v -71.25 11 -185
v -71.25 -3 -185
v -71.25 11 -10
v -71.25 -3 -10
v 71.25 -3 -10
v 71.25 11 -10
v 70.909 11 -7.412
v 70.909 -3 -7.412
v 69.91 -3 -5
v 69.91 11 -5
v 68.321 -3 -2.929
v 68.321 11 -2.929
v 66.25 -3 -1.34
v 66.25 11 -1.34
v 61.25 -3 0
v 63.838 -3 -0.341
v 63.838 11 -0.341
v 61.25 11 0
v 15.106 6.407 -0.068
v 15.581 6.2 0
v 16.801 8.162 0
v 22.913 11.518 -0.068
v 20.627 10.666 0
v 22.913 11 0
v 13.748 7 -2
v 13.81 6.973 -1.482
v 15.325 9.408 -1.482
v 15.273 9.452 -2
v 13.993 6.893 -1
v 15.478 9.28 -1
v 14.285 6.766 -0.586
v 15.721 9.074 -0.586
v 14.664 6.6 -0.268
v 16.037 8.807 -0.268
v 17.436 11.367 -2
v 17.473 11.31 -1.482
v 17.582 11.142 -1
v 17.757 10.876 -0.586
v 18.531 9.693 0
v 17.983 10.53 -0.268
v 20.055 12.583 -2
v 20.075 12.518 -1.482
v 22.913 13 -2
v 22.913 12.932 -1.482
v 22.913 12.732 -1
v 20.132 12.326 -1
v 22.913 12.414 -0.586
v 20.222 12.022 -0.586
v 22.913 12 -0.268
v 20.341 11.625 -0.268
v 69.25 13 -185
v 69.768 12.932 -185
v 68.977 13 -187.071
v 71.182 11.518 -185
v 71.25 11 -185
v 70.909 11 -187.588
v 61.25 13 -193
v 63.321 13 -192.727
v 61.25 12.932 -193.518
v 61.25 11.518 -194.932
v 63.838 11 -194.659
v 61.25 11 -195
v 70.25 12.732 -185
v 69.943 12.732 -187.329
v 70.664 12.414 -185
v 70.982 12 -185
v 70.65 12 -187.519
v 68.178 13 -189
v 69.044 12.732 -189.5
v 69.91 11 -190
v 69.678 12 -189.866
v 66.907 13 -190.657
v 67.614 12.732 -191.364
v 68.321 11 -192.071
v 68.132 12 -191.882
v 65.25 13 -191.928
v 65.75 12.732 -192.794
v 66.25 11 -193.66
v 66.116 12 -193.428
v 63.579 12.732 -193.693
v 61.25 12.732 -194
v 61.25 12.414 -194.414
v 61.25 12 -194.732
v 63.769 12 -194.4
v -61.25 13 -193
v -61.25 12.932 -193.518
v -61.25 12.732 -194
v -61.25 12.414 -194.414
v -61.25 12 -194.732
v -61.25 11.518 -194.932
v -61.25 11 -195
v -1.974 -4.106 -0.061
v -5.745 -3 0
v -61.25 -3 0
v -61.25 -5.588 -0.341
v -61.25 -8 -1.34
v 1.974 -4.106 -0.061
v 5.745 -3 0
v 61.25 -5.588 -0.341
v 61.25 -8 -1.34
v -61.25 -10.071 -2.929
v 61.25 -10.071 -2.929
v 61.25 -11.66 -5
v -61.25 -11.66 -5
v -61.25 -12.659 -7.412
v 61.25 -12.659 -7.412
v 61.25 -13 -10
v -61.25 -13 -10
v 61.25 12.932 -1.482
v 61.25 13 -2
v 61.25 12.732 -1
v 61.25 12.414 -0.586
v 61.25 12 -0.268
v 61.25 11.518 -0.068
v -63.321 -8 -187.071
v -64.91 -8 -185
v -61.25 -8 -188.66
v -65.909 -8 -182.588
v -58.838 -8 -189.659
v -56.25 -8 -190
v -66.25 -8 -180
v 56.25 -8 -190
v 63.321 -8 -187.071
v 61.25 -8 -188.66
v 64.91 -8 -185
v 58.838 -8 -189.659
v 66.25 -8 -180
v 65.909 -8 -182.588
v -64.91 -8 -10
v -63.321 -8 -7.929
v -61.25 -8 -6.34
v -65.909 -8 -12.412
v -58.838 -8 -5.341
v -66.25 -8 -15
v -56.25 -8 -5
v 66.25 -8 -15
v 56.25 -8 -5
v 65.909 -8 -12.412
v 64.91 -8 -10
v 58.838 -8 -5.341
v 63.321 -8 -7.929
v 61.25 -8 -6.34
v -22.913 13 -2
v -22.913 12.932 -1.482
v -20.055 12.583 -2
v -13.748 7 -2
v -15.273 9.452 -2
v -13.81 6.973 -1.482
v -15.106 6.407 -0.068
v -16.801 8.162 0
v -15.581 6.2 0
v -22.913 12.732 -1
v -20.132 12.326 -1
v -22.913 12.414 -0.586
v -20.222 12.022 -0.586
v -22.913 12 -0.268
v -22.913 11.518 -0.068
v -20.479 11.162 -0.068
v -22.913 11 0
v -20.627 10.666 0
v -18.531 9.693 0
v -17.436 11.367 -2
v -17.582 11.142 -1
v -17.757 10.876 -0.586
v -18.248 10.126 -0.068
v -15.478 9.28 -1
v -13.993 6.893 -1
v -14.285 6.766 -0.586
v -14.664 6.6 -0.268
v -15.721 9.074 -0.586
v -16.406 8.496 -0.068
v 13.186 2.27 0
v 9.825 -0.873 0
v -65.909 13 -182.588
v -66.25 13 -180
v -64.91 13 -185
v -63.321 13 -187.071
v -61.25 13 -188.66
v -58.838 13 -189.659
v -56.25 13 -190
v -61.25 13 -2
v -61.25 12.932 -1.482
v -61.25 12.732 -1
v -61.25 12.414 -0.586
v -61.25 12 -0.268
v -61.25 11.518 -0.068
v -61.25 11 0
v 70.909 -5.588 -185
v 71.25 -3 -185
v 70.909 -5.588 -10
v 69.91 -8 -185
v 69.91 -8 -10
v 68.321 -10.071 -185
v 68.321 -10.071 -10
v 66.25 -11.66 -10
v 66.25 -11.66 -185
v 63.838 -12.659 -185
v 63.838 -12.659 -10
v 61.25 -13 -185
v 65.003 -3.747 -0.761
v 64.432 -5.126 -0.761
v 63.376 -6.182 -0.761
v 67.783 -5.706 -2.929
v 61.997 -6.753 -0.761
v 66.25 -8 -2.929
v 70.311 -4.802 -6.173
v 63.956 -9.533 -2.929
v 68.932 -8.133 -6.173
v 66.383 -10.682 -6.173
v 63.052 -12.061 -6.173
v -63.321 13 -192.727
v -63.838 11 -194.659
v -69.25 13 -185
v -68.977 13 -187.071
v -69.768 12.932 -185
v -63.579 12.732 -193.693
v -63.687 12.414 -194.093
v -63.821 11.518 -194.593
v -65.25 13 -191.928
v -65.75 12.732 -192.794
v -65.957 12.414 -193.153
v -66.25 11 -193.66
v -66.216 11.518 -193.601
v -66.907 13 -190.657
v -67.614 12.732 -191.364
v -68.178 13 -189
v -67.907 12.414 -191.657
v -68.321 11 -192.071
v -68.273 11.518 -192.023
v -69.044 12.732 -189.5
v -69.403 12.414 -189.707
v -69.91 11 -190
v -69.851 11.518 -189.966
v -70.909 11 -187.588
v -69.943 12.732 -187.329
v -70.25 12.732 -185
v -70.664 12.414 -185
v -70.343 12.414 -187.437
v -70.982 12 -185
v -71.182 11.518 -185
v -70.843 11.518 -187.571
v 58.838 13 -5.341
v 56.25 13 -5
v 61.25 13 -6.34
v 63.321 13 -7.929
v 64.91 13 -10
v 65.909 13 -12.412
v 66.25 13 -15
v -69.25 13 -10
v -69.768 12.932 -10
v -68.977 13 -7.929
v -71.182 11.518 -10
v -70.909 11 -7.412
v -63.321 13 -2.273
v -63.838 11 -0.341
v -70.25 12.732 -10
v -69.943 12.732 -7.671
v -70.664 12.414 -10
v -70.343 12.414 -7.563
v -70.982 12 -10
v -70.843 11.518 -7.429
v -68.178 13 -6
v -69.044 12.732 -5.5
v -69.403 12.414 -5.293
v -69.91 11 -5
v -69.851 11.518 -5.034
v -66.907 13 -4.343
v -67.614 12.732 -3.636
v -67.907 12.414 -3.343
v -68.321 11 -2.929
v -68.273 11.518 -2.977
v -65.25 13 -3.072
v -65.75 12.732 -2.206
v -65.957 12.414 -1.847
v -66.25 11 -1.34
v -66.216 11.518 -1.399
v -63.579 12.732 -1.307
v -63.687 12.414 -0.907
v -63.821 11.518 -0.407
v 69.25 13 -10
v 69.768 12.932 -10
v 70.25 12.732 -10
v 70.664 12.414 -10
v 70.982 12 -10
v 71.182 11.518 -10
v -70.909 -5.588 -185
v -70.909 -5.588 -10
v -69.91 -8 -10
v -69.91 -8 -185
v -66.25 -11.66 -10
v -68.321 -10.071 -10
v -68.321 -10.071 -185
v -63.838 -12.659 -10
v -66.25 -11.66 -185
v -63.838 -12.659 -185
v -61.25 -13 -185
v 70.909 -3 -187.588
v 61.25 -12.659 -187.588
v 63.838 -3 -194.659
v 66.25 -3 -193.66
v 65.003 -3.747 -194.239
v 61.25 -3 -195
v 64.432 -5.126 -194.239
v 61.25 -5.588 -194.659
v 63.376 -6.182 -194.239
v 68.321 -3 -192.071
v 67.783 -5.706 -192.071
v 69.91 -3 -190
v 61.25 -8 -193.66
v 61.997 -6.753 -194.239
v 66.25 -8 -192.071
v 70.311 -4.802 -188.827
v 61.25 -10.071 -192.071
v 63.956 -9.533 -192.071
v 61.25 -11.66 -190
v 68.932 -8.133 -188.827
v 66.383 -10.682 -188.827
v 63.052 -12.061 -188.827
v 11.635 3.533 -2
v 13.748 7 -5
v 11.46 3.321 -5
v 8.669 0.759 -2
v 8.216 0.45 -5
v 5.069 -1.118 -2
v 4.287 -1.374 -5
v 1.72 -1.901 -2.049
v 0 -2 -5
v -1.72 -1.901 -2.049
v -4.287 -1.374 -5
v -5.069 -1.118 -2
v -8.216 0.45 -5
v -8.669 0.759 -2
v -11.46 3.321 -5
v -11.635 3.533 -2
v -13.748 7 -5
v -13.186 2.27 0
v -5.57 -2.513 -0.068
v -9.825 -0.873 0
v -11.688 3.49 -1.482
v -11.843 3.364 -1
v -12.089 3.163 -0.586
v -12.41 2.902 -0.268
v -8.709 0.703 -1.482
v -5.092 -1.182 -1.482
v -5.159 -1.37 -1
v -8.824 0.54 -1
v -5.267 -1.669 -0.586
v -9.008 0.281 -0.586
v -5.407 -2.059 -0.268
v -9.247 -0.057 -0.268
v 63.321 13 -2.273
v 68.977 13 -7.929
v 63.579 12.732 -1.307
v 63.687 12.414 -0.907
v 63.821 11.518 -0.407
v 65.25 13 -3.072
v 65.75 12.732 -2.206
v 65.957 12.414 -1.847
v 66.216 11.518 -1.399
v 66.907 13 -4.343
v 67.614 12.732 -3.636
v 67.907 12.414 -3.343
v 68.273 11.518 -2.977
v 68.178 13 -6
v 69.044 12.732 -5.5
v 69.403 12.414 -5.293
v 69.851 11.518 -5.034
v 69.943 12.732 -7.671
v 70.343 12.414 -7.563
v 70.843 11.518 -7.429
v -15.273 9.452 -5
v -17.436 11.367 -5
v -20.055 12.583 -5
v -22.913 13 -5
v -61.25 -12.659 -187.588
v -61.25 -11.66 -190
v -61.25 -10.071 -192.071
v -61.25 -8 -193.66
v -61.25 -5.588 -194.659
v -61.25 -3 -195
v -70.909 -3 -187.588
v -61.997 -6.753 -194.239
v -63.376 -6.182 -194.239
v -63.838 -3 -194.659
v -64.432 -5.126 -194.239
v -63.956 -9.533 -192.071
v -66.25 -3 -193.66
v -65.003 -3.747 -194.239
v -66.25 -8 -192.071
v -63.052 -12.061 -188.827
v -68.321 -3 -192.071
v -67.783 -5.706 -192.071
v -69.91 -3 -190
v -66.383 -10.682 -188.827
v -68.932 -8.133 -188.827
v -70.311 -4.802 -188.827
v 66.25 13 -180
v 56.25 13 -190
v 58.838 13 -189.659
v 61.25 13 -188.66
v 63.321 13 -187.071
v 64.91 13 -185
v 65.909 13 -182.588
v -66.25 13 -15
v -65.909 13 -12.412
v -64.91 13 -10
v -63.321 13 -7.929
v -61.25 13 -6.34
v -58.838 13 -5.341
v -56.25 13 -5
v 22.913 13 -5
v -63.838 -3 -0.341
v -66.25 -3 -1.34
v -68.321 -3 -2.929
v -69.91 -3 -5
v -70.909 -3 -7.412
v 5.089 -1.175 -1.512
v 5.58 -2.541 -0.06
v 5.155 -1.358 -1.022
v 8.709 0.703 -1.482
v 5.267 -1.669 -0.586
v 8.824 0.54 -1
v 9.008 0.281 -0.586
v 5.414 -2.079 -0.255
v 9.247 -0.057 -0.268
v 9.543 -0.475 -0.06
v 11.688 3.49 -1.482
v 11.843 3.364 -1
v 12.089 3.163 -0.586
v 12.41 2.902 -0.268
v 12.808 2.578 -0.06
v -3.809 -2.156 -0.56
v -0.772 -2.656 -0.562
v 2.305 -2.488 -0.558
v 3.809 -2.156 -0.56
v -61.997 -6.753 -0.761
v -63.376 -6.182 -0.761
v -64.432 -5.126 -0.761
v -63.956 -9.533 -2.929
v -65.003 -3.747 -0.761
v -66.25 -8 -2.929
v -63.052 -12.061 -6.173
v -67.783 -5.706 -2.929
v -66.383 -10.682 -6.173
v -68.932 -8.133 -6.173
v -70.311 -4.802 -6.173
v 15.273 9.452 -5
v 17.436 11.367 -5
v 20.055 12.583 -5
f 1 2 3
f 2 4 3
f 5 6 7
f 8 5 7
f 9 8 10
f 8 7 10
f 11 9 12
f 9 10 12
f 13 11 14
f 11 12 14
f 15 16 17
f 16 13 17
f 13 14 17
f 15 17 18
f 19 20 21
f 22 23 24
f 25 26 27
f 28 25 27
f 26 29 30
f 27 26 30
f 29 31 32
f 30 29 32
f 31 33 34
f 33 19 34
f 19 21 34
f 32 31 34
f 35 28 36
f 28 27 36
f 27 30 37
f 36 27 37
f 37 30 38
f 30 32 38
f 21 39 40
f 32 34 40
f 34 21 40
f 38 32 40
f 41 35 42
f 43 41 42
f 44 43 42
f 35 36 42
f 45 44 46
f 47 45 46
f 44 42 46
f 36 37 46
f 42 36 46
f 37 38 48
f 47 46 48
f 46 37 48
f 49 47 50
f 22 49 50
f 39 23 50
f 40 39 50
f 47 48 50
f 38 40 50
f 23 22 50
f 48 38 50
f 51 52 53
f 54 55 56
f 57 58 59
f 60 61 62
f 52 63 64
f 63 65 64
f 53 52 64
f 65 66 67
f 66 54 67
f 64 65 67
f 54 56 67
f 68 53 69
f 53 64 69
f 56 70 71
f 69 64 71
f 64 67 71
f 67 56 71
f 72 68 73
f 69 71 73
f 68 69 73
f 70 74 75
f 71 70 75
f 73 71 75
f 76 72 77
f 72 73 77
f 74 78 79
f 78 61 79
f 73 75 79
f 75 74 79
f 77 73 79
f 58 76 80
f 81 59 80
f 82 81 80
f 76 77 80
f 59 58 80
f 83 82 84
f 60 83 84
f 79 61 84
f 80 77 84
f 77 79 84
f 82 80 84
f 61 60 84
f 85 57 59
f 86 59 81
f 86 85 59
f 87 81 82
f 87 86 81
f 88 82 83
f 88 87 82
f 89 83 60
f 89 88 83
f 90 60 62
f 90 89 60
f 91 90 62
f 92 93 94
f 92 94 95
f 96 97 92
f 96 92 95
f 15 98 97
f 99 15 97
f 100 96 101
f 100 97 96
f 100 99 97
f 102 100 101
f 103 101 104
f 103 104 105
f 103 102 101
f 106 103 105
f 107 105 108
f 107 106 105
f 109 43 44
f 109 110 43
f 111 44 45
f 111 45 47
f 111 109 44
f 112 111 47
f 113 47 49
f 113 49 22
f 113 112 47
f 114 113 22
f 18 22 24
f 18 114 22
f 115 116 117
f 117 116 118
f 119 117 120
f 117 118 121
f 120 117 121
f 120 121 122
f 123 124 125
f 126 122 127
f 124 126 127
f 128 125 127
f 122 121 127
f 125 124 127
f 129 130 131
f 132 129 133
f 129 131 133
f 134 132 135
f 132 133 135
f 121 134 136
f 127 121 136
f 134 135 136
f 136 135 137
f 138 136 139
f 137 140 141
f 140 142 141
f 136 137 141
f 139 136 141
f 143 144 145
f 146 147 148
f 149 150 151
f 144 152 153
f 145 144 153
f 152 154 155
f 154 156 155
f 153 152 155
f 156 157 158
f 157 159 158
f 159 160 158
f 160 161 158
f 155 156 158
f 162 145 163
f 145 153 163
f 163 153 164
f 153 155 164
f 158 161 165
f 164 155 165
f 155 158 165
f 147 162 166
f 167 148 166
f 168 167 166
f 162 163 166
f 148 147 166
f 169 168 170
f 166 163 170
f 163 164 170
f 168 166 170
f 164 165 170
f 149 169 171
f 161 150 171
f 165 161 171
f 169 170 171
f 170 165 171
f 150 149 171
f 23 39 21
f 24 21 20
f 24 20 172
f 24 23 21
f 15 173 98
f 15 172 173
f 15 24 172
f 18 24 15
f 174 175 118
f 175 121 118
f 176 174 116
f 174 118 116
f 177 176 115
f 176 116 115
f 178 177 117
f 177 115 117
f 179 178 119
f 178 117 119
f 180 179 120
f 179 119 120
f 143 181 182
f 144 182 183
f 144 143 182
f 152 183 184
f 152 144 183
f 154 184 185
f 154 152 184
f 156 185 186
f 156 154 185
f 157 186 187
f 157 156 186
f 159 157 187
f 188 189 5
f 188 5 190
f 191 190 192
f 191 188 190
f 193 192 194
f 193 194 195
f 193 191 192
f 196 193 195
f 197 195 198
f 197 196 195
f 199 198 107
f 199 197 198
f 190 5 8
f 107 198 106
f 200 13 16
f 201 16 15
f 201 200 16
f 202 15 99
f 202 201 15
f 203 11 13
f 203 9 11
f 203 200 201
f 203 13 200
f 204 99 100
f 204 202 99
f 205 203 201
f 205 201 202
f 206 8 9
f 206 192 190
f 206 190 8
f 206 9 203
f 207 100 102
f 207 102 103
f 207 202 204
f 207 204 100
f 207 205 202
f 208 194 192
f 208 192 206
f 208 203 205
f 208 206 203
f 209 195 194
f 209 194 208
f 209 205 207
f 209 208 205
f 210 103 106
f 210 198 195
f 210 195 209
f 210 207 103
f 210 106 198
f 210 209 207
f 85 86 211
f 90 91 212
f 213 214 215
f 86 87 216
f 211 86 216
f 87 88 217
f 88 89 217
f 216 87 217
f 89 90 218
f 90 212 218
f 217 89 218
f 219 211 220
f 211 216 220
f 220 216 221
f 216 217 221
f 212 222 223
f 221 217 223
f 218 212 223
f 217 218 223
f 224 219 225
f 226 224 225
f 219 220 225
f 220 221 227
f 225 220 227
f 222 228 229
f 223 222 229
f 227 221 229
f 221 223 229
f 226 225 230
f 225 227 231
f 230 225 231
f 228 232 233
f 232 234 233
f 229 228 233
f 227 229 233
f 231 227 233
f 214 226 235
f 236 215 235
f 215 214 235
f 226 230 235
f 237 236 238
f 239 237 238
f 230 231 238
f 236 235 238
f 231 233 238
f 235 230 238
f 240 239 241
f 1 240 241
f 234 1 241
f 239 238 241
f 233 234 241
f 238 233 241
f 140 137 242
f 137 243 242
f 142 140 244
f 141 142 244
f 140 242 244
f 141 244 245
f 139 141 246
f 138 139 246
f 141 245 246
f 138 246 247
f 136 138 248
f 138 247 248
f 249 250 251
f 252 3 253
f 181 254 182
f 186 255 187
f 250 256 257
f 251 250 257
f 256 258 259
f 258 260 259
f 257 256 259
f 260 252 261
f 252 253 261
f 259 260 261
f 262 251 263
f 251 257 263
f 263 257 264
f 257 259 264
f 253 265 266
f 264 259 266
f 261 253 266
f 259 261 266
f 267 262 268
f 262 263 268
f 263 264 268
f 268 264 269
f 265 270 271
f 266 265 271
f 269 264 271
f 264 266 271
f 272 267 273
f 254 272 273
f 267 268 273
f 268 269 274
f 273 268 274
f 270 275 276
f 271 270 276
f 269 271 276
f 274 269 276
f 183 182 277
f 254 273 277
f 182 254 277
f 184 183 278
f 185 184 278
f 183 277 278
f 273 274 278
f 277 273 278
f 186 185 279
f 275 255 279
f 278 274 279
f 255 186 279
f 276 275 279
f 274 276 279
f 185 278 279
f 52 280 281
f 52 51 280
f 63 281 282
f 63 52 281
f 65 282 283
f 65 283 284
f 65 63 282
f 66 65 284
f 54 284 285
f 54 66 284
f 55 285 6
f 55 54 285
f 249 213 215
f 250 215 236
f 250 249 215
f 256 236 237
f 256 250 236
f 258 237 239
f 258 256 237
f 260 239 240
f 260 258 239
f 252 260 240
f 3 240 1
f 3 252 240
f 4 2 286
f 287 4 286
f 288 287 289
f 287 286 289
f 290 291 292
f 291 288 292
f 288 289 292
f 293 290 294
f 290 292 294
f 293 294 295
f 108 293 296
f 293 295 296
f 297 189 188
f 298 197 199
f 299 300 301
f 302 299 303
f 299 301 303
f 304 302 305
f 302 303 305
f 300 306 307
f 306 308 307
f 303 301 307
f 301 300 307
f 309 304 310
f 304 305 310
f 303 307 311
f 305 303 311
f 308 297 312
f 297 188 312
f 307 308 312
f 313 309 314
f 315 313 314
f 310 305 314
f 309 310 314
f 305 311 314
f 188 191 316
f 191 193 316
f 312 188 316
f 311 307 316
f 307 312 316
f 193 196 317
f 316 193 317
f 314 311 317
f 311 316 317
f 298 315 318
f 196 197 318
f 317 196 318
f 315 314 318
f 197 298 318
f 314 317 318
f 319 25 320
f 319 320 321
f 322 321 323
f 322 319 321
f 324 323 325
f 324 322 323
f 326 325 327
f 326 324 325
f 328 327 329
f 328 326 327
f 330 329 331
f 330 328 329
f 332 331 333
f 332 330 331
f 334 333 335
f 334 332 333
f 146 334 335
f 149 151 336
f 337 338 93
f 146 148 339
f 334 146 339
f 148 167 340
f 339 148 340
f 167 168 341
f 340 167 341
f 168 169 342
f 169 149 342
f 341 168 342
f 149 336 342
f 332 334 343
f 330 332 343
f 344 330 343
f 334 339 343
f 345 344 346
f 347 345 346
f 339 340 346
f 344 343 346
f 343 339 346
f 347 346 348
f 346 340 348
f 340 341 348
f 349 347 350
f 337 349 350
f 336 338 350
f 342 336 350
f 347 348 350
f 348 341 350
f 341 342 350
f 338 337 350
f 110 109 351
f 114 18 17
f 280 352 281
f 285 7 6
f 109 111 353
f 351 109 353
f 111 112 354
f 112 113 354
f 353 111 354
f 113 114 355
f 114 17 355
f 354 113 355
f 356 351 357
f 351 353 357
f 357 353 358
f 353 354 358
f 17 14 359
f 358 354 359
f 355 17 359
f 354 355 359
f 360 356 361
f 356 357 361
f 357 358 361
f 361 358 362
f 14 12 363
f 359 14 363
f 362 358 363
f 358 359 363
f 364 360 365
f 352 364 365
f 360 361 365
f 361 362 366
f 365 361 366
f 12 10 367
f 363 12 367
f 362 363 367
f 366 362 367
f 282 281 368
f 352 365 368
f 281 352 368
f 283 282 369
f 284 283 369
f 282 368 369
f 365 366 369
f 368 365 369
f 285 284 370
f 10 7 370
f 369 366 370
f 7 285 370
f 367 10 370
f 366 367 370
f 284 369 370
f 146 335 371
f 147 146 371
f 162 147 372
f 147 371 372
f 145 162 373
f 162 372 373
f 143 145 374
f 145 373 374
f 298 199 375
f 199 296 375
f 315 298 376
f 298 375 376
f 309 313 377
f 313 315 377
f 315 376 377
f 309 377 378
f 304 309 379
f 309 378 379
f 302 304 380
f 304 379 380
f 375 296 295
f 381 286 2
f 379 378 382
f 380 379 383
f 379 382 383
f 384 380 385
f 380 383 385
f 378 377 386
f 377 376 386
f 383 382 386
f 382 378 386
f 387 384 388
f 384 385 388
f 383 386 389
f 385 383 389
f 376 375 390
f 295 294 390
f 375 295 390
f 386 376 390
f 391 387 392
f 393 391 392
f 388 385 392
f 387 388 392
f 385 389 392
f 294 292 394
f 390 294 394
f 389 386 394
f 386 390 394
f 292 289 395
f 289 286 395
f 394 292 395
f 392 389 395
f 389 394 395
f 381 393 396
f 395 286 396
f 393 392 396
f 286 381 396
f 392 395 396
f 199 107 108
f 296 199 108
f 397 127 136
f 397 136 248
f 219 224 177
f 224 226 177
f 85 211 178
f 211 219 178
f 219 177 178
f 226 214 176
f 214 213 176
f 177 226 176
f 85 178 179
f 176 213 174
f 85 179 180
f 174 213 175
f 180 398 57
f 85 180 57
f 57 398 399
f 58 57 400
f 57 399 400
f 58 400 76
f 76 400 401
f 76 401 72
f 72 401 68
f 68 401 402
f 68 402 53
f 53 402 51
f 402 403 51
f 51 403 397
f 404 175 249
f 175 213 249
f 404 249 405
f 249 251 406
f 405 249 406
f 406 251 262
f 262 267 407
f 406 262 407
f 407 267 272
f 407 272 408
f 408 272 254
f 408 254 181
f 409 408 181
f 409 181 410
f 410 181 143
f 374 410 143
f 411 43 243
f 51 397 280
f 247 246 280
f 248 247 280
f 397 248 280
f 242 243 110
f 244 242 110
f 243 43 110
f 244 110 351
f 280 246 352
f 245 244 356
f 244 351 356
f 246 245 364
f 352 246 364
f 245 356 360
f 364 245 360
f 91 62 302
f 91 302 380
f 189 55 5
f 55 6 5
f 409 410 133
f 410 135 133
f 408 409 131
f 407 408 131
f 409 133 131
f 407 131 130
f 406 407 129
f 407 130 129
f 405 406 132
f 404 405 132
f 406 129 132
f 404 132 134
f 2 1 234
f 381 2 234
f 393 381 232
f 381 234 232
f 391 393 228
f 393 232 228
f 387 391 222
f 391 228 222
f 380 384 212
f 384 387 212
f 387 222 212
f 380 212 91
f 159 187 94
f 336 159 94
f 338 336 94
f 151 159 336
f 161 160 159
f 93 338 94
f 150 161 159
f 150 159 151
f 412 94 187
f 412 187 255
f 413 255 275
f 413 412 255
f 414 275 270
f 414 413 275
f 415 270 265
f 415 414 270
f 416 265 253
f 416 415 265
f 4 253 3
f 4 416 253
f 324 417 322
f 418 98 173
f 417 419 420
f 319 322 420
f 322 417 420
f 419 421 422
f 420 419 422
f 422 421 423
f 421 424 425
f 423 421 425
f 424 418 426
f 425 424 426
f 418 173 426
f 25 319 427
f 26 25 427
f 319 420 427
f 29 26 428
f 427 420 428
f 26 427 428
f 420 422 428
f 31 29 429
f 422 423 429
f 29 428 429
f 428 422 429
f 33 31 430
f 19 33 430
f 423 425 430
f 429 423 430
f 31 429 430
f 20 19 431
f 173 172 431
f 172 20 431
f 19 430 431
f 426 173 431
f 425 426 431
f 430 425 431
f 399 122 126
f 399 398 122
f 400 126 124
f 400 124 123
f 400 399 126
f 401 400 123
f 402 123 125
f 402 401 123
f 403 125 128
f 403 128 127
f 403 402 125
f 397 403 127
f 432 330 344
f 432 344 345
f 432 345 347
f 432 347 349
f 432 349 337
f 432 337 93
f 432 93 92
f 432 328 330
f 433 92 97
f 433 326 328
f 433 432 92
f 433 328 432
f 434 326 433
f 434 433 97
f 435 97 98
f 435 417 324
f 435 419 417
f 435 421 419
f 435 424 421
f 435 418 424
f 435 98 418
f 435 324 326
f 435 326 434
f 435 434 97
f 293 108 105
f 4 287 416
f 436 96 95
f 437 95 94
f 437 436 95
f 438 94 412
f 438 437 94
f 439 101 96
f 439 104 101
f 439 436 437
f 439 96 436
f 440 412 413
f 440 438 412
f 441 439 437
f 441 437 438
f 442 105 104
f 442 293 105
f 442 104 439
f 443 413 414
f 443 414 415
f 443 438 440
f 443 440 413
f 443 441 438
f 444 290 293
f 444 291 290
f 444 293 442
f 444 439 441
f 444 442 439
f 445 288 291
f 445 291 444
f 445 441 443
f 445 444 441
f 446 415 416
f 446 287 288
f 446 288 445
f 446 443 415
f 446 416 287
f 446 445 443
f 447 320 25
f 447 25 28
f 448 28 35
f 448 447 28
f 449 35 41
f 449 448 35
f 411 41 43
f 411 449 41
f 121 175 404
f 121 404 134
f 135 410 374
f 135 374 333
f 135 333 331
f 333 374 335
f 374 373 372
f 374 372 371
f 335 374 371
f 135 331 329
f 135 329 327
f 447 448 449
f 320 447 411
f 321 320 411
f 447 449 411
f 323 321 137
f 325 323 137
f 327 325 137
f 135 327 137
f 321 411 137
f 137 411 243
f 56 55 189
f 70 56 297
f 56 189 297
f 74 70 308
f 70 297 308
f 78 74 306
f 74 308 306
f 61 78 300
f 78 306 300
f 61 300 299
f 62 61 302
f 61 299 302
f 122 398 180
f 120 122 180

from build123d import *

# Parameters (mm, degrees)
BOSS_EXTRUDE1_DEPTH = 5
BOSS_EXTRUDE2_DEPTH = 185
BOSS_EXTRUDE3_DEPTH = 5
FILLET1_R           = 10
FILLET2_R           = 2


with BuildPart() as part:
    # Sketch1 → Boss-Extrude1 (new body)
    with BuildSketch(Plane.XY):
        with BuildLine():
            Line((-71.25, 13), (-71.25, -13))
            Line((-71.25, -13), (71.25, -13))
            Line((71.25, -13), (71.25, 13))
            Line((71.25, 13), (15, 13))
            ThreePointArc((15, 13), (0, -2), (-15, 13))
            Line((-15, 13), (-71.25, 13))
        make_face()
    extrude(amount=-BOSS_EXTRUDE1_DEPTH)

    # Sketch2 → Boss-Extrude2 (add)
    with BuildSketch(Plane(origin=(0, 0, -5), x_dir=(-1, 0, 0), z_dir=(0, 0, -1))):
        Polygon((-66.25, -8), (-66.25, 8), (-66.25, 13), (-71.25, 13), (-71.25, -13), (71.25, -13), (71.25, 13), (66.25, 13), (66.25, 8), (66.25, -8), align=None)
    extrude(amount=BOSS_EXTRUDE2_DEPTH)

    # Sketch3 → Boss-Extrude3 (add)
    with BuildSketch(Plane(origin=(0, 0, -190), x_dir=(-1, 0, 0), z_dir=(0, 0, -1))):
        with BuildLine():
            Line((-66.25, 13), (-66.25, -8))
            Line((-66.25, -8), (66.25, -8))
            Line((66.25, -8), (66.25, 13))
            Line((66.25, 13), (15, 13))
            ThreePointArc((15, 13), (0, -2), (-15, 13))
            Line((-15, 13), (-66.25, 13))
        make_face()
        with BuildLine():
            Line((15, 13), (-15, 13))
            ThreePointArc((-15, 13), (0, -2), (15, 13))
        make_face()
        Polygon((71.25, 13), (66.25, 13), (66.25, -8), (-66.25, -8), (-66.25, 13), (-71.25, 13), (-71.25, -13), (71.25, -13), align=None)
    extrude(amount=BOSS_EXTRUDE3_DEPTH)

    # Fillet1
    fillet1_edges = [part.edges().sort_by_distance(p)[0] for p in [
        (71.25, -13, -97.5),
        (-71.25, -13, -97.5),
        (-15, 13, -2.5),
        (15, 13, -2.5),
        (-66.25, 2.5, -190),
        (66.25, 2.5, -190),
        (-66.25, 2.5, -5),
        (66.25, 2.5, -5),
        (71.25, 0, -195),
        (0, -13, -195),
        (-71.25, 0, -195),
        (71.25, 0, 0),
        (0, -13, 0),
        (-71.25, 0, 0),
    ]]
    fillet(fillet1_edges, radius=FILLET1_R)

    # Fillet2
    fillet2_edges = [part.edges().sort_by_distance(p)[0] for p in [
        (68.321067812, 13, -192.071067812),
        (-68.321067812, 13, -192.071067812),
        (42.081439237, 13, 0),
        (0, -2, 0),
        (-42.081439237, 13, 0),
        (-17.4356529, 11.366600265, 0),
        (17.4356529, 11.366600265, 0),
        (0, 13, -195),
        (71.25, 13, -97.5),
        (-71.25, 13, -97.5),
        (-68.321067812, 13, -2.928932188),
        (68.321067812, 13, -2.928932188),
    ]]
    fillet(fillet2_edges, radius=FILLET2_R)


solid = part.part
